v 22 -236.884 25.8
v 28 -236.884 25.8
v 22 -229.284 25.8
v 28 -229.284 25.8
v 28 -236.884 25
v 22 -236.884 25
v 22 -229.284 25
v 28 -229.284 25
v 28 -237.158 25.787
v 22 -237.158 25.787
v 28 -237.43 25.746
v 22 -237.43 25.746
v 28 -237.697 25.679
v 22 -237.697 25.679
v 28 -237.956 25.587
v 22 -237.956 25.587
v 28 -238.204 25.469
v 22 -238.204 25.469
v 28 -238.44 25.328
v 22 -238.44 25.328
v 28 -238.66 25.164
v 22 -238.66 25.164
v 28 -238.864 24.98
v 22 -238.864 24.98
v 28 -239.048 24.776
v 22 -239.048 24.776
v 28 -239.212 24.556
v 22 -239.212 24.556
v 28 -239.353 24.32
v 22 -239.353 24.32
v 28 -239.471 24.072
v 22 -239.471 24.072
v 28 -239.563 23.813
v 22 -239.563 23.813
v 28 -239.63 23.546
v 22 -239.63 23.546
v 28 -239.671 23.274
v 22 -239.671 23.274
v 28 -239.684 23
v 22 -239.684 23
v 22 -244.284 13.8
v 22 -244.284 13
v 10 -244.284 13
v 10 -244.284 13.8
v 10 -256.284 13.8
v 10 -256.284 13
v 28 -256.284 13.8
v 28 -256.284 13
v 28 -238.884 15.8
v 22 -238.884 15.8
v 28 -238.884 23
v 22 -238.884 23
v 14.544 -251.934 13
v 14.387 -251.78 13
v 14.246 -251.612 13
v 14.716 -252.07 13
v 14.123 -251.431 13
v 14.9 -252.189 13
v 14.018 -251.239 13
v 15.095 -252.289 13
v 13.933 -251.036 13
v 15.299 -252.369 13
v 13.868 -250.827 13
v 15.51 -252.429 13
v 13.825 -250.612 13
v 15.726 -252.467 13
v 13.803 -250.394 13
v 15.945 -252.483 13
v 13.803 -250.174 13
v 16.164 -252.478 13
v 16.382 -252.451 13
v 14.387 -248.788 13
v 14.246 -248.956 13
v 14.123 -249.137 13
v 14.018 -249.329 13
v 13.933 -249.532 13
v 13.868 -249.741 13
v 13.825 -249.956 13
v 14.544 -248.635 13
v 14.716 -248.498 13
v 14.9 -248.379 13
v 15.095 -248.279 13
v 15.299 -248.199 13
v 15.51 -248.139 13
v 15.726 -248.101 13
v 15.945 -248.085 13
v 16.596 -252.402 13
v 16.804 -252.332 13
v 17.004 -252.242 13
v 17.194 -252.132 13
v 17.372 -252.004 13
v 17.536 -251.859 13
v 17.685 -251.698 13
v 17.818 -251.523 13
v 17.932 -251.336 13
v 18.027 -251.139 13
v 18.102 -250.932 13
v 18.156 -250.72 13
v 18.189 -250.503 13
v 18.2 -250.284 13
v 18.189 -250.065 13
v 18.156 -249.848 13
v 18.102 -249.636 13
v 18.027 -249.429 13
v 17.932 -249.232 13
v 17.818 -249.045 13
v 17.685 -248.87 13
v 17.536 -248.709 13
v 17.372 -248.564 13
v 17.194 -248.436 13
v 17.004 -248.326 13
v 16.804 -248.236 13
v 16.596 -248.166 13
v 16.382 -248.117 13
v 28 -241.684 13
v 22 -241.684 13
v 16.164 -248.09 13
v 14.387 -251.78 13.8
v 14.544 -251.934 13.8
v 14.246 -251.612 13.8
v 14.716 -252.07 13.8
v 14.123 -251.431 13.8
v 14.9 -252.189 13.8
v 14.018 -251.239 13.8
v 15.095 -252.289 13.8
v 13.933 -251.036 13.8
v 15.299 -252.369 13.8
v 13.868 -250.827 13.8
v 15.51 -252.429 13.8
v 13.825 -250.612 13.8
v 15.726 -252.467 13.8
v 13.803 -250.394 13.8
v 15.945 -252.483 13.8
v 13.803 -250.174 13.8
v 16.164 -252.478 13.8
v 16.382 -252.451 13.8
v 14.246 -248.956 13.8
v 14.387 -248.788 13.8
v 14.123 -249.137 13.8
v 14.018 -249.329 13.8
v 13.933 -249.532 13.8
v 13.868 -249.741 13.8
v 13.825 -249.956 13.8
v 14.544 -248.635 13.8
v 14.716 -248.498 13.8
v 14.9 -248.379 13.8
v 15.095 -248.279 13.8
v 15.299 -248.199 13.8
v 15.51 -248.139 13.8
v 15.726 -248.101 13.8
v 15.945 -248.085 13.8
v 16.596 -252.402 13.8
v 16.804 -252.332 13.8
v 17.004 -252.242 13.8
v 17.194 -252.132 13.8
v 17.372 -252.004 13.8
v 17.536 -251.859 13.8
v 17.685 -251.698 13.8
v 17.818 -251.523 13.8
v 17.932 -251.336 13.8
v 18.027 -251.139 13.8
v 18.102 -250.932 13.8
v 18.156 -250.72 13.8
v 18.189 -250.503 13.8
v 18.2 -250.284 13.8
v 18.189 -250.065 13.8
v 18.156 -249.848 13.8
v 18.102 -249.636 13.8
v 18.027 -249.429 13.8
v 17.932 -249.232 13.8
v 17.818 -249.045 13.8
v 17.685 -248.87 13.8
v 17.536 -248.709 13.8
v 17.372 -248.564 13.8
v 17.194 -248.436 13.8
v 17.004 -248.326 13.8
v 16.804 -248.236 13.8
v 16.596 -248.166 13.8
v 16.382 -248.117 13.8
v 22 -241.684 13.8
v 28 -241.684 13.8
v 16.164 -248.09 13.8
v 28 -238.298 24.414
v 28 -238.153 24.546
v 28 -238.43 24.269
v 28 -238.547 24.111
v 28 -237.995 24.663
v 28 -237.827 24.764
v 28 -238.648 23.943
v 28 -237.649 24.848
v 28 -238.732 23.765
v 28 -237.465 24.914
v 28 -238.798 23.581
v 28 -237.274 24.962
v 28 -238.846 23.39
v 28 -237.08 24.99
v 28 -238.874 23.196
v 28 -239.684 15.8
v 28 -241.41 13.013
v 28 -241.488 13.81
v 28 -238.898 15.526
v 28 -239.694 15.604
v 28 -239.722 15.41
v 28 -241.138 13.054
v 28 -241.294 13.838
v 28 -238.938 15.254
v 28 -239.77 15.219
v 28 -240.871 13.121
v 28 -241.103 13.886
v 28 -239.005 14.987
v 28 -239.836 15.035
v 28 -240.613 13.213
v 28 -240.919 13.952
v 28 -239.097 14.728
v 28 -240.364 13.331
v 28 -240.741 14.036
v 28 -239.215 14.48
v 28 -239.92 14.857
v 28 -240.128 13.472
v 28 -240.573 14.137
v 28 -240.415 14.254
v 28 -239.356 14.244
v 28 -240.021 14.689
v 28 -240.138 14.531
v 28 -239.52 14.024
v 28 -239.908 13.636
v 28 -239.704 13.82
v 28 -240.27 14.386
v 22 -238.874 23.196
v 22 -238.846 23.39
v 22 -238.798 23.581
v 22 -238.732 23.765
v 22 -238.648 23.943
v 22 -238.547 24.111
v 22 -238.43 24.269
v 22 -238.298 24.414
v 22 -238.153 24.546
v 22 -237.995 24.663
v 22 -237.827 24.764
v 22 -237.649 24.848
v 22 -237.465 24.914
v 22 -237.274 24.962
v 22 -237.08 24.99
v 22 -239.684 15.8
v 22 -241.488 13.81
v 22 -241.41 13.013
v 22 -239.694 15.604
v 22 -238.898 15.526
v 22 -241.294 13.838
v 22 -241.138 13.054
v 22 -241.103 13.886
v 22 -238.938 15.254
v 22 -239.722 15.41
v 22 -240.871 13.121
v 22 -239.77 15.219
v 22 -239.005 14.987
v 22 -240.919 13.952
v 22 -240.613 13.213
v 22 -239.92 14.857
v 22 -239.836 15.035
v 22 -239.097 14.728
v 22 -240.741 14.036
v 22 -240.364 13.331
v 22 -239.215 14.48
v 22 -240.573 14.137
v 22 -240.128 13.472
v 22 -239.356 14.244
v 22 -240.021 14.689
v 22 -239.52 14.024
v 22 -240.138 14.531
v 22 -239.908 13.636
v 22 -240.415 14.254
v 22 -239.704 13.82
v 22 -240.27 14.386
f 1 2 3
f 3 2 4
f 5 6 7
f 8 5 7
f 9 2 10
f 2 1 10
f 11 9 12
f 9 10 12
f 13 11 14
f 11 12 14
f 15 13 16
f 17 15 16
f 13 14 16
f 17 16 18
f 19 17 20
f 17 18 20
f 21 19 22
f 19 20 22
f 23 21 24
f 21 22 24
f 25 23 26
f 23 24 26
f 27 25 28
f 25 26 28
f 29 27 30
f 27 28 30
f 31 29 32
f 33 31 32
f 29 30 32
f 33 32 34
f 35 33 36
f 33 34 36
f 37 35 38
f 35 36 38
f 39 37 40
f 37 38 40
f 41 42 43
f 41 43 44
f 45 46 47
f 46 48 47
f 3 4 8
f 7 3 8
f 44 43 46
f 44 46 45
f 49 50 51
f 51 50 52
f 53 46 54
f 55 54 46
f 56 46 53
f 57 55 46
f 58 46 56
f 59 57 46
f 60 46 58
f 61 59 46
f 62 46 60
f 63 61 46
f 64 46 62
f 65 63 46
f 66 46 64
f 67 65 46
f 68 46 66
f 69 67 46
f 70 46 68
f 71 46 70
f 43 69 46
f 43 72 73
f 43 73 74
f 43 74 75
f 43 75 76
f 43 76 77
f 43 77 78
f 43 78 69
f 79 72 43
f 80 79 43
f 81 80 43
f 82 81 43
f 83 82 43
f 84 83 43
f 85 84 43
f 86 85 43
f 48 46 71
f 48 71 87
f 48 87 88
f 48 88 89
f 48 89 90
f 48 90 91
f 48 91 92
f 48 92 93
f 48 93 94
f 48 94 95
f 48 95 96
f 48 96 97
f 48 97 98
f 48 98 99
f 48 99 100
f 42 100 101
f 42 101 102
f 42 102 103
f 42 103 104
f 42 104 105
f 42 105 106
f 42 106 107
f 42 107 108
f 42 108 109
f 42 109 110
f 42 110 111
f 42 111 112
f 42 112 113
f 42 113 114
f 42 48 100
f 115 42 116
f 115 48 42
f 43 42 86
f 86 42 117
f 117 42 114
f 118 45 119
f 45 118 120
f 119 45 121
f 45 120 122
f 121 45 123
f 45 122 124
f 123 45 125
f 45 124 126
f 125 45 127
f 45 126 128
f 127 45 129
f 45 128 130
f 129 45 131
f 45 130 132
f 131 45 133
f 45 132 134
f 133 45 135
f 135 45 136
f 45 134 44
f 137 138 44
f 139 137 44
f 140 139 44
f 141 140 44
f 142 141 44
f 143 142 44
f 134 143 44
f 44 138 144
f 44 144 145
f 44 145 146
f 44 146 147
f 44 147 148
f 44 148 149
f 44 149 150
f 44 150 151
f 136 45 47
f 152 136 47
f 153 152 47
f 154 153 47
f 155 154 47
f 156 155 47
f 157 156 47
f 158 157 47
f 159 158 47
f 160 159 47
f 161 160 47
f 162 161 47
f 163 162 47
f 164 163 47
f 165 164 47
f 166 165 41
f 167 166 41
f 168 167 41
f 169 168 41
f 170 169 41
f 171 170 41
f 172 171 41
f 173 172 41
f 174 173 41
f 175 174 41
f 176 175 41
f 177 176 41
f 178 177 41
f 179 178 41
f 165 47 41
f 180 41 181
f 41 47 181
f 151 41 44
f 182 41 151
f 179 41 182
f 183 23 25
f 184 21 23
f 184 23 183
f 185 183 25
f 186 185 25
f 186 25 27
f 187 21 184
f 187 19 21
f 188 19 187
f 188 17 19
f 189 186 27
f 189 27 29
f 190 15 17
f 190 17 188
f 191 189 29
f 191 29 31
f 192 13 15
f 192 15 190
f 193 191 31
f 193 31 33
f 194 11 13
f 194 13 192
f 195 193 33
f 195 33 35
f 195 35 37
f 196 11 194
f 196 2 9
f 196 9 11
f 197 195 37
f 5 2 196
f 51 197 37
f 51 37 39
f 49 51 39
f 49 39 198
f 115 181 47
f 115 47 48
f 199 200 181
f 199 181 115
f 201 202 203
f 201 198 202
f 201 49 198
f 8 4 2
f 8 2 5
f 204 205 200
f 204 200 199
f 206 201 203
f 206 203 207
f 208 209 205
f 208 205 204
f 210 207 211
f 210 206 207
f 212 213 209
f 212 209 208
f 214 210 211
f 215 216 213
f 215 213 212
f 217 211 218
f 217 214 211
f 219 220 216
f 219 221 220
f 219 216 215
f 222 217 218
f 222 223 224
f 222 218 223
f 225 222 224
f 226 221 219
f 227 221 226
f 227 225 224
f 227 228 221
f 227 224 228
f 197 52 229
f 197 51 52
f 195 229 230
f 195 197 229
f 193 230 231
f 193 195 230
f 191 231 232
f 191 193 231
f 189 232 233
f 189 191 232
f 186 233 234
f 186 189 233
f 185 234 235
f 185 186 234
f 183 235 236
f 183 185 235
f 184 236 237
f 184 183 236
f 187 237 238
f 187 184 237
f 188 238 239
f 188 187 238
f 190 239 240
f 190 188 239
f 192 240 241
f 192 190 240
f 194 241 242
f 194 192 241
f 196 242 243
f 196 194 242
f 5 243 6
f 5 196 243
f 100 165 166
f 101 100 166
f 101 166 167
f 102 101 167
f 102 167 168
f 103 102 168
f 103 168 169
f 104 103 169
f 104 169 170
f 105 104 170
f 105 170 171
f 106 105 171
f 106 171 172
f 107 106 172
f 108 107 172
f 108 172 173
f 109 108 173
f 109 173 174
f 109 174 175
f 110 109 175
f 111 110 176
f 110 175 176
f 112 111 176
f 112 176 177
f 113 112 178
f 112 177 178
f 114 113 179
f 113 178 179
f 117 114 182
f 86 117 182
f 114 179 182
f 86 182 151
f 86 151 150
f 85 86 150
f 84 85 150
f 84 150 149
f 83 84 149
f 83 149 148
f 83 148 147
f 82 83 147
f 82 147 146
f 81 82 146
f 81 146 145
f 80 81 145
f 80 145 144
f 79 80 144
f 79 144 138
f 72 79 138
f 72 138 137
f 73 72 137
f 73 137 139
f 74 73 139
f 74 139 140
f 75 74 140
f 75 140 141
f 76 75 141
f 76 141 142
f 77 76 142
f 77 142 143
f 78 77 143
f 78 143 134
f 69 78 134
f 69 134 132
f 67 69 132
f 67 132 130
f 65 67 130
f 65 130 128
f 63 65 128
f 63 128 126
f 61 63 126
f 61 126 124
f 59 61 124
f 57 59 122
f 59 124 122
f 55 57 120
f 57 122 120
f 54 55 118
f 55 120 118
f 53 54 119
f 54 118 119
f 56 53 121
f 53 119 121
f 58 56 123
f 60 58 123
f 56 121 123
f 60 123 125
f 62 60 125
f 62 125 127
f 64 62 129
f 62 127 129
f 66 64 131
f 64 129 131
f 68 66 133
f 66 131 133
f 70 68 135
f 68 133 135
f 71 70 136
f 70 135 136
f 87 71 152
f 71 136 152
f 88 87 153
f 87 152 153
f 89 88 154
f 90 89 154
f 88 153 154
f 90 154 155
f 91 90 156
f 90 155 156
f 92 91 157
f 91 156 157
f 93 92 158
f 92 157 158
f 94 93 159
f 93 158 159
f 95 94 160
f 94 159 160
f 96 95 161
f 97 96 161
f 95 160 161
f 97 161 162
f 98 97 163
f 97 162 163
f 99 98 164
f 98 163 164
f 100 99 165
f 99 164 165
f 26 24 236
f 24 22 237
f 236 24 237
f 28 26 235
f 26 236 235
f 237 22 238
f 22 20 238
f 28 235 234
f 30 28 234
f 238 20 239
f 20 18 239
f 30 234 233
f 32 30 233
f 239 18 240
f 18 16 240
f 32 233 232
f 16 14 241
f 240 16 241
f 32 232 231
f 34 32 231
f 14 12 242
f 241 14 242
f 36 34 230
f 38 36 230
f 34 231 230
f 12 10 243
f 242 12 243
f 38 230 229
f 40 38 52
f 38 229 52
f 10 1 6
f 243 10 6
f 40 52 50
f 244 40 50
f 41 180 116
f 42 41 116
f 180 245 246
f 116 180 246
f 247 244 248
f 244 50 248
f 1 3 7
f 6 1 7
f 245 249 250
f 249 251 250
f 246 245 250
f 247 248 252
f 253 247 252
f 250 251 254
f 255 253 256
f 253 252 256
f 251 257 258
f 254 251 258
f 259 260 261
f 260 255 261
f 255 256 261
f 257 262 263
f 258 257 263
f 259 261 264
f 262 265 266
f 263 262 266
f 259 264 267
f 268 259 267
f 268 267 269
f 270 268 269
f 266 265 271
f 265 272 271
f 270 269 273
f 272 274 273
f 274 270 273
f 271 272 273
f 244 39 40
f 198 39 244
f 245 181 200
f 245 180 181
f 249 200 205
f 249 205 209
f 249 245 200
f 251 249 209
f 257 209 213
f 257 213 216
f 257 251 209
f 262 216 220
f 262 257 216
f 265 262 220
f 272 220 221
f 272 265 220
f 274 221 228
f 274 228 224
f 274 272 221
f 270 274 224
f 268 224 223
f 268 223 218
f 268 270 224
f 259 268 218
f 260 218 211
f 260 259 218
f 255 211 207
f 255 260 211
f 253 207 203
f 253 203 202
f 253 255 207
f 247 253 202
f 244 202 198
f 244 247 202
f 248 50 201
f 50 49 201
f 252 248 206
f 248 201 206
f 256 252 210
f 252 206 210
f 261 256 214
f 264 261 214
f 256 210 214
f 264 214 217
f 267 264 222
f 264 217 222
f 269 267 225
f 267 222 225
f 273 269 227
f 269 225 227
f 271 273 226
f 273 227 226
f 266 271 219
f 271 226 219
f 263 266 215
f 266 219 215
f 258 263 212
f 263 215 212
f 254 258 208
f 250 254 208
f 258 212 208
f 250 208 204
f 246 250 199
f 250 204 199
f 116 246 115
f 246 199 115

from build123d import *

# Parameters (mm, degrees)
SKETCH1_W           = 12.8
SKETCH1_H           = 27
BOSS_EXTRUDE1_DEPTH = 6
SKETCH2_W           = 12
SKETCH2_H           = 16.6
CUT_EXTRUDE1_DEPTH  = 258.649269937
SKETCH3_W           = 0.8
SKETCH3_H           = 12
BOSS_EXTRUDE2_DEPTH = 12
SKETCH4_W           = 12
SKETCH4_H           = 9.6
CUT_EXTRUDE2_DEPTH  = 258.858772003
HOLE1_D             = 4.4
HOLE1_DEPTH         = 12.8
FILLET1_R           = 2
FILLET2_R           = 2
FILLET3_R           = 2.8
FILLET4_R           = 2.8


with BuildPart() as part:
    # Sketch1 → Boss-Extrude1 (new body)
    with BuildSketch(Plane(origin=(27.999999016, 0, 0), x_dir=(0, 0, -1), z_dir=(1, 0, 0))):
        with Locations((-19.400000091, -242.784034412)):
            Rectangle(SKETCH1_W, SKETCH1_H)
    extrude(amount=-BOSS_EXTRUDE1_DEPTH)

    # Sketch2 → Cut-Extrude1 (cut, through all)
    with BuildSketch(Plane(origin=(27.999999016, 0, 0), x_dir=(0, 0, -1), z_dir=(1, 0, 0))):
        with Locations((-19.800000091, -247.984034412)):
            Rectangle(SKETCH2_W, SKETCH2_H)
    extrude(amount=-CUT_EXTRUDE1_DEPTH, mode=Mode.SUBTRACT)

    # Sketch3 → Boss-Extrude2 (add)
    with BuildSketch(Plane.ZY.offset(-21.999999016)):
        with Locations((13.400000091, -250.284034412)):
            Rectangle(SKETCH3_W, SKETCH3_H)
    extrude(amount=BOSS_EXTRUDE2_DEPTH)

    # Sketch4 → Cut-Extrude2 (cut, through all)
    with BuildSketch(Plane.ZY.offset(-21.999999016)):
        with Locations((19.000000091, -234.084034412)):
            Rectangle(SKETCH4_W, SKETCH4_H)
    extrude(amount=-CUT_EXTRUDE2_DEPTH, mode=Mode.SUBTRACT)

    # Hole1
    with Locations(Plane(origin=(0, 0, 13.000000091), x_dir=(-1, 0, 0), z_dir=(0, 0, -1))):
        with Locations((-15.999999016, -250.284034412)):
            Hole(HOLE1_D / 2, depth=HOLE1_DEPTH)

    # Fillet1
    fillet1_edges = [part.edges().sort_by_distance(p)[0] for p in [
        (24.999999016, -239.684034412, 13.800000091),
    ]]
    fillet(fillet1_edges, radius=FILLET1_R)

    # Fillet2
    fillet2_edges = [part.edges().sort_by_distance(p)[0] for p in [
        (24.999999016, -238.884034412, 25.000000091),
    ]]
    fillet(fillet2_edges, radius=FILLET2_R)

    # Fillet3
    fillet3_edges = [part.edges().sort_by_distance(p)[0] for p in [
        (24.999999016, -239.684034412, 25.800000091),
    ]]
    fillet(fillet3_edges, radius=FILLET3_R)

    # Fillet4
    fillet4_edges = [part.edges().sort_by_distance(p)[0] for p in [
        (24.999999016, -238.884034412, 13.000000091),
    ]]
    fillet(fillet4_edges, radius=FILLET4_R)


solid = part.part
